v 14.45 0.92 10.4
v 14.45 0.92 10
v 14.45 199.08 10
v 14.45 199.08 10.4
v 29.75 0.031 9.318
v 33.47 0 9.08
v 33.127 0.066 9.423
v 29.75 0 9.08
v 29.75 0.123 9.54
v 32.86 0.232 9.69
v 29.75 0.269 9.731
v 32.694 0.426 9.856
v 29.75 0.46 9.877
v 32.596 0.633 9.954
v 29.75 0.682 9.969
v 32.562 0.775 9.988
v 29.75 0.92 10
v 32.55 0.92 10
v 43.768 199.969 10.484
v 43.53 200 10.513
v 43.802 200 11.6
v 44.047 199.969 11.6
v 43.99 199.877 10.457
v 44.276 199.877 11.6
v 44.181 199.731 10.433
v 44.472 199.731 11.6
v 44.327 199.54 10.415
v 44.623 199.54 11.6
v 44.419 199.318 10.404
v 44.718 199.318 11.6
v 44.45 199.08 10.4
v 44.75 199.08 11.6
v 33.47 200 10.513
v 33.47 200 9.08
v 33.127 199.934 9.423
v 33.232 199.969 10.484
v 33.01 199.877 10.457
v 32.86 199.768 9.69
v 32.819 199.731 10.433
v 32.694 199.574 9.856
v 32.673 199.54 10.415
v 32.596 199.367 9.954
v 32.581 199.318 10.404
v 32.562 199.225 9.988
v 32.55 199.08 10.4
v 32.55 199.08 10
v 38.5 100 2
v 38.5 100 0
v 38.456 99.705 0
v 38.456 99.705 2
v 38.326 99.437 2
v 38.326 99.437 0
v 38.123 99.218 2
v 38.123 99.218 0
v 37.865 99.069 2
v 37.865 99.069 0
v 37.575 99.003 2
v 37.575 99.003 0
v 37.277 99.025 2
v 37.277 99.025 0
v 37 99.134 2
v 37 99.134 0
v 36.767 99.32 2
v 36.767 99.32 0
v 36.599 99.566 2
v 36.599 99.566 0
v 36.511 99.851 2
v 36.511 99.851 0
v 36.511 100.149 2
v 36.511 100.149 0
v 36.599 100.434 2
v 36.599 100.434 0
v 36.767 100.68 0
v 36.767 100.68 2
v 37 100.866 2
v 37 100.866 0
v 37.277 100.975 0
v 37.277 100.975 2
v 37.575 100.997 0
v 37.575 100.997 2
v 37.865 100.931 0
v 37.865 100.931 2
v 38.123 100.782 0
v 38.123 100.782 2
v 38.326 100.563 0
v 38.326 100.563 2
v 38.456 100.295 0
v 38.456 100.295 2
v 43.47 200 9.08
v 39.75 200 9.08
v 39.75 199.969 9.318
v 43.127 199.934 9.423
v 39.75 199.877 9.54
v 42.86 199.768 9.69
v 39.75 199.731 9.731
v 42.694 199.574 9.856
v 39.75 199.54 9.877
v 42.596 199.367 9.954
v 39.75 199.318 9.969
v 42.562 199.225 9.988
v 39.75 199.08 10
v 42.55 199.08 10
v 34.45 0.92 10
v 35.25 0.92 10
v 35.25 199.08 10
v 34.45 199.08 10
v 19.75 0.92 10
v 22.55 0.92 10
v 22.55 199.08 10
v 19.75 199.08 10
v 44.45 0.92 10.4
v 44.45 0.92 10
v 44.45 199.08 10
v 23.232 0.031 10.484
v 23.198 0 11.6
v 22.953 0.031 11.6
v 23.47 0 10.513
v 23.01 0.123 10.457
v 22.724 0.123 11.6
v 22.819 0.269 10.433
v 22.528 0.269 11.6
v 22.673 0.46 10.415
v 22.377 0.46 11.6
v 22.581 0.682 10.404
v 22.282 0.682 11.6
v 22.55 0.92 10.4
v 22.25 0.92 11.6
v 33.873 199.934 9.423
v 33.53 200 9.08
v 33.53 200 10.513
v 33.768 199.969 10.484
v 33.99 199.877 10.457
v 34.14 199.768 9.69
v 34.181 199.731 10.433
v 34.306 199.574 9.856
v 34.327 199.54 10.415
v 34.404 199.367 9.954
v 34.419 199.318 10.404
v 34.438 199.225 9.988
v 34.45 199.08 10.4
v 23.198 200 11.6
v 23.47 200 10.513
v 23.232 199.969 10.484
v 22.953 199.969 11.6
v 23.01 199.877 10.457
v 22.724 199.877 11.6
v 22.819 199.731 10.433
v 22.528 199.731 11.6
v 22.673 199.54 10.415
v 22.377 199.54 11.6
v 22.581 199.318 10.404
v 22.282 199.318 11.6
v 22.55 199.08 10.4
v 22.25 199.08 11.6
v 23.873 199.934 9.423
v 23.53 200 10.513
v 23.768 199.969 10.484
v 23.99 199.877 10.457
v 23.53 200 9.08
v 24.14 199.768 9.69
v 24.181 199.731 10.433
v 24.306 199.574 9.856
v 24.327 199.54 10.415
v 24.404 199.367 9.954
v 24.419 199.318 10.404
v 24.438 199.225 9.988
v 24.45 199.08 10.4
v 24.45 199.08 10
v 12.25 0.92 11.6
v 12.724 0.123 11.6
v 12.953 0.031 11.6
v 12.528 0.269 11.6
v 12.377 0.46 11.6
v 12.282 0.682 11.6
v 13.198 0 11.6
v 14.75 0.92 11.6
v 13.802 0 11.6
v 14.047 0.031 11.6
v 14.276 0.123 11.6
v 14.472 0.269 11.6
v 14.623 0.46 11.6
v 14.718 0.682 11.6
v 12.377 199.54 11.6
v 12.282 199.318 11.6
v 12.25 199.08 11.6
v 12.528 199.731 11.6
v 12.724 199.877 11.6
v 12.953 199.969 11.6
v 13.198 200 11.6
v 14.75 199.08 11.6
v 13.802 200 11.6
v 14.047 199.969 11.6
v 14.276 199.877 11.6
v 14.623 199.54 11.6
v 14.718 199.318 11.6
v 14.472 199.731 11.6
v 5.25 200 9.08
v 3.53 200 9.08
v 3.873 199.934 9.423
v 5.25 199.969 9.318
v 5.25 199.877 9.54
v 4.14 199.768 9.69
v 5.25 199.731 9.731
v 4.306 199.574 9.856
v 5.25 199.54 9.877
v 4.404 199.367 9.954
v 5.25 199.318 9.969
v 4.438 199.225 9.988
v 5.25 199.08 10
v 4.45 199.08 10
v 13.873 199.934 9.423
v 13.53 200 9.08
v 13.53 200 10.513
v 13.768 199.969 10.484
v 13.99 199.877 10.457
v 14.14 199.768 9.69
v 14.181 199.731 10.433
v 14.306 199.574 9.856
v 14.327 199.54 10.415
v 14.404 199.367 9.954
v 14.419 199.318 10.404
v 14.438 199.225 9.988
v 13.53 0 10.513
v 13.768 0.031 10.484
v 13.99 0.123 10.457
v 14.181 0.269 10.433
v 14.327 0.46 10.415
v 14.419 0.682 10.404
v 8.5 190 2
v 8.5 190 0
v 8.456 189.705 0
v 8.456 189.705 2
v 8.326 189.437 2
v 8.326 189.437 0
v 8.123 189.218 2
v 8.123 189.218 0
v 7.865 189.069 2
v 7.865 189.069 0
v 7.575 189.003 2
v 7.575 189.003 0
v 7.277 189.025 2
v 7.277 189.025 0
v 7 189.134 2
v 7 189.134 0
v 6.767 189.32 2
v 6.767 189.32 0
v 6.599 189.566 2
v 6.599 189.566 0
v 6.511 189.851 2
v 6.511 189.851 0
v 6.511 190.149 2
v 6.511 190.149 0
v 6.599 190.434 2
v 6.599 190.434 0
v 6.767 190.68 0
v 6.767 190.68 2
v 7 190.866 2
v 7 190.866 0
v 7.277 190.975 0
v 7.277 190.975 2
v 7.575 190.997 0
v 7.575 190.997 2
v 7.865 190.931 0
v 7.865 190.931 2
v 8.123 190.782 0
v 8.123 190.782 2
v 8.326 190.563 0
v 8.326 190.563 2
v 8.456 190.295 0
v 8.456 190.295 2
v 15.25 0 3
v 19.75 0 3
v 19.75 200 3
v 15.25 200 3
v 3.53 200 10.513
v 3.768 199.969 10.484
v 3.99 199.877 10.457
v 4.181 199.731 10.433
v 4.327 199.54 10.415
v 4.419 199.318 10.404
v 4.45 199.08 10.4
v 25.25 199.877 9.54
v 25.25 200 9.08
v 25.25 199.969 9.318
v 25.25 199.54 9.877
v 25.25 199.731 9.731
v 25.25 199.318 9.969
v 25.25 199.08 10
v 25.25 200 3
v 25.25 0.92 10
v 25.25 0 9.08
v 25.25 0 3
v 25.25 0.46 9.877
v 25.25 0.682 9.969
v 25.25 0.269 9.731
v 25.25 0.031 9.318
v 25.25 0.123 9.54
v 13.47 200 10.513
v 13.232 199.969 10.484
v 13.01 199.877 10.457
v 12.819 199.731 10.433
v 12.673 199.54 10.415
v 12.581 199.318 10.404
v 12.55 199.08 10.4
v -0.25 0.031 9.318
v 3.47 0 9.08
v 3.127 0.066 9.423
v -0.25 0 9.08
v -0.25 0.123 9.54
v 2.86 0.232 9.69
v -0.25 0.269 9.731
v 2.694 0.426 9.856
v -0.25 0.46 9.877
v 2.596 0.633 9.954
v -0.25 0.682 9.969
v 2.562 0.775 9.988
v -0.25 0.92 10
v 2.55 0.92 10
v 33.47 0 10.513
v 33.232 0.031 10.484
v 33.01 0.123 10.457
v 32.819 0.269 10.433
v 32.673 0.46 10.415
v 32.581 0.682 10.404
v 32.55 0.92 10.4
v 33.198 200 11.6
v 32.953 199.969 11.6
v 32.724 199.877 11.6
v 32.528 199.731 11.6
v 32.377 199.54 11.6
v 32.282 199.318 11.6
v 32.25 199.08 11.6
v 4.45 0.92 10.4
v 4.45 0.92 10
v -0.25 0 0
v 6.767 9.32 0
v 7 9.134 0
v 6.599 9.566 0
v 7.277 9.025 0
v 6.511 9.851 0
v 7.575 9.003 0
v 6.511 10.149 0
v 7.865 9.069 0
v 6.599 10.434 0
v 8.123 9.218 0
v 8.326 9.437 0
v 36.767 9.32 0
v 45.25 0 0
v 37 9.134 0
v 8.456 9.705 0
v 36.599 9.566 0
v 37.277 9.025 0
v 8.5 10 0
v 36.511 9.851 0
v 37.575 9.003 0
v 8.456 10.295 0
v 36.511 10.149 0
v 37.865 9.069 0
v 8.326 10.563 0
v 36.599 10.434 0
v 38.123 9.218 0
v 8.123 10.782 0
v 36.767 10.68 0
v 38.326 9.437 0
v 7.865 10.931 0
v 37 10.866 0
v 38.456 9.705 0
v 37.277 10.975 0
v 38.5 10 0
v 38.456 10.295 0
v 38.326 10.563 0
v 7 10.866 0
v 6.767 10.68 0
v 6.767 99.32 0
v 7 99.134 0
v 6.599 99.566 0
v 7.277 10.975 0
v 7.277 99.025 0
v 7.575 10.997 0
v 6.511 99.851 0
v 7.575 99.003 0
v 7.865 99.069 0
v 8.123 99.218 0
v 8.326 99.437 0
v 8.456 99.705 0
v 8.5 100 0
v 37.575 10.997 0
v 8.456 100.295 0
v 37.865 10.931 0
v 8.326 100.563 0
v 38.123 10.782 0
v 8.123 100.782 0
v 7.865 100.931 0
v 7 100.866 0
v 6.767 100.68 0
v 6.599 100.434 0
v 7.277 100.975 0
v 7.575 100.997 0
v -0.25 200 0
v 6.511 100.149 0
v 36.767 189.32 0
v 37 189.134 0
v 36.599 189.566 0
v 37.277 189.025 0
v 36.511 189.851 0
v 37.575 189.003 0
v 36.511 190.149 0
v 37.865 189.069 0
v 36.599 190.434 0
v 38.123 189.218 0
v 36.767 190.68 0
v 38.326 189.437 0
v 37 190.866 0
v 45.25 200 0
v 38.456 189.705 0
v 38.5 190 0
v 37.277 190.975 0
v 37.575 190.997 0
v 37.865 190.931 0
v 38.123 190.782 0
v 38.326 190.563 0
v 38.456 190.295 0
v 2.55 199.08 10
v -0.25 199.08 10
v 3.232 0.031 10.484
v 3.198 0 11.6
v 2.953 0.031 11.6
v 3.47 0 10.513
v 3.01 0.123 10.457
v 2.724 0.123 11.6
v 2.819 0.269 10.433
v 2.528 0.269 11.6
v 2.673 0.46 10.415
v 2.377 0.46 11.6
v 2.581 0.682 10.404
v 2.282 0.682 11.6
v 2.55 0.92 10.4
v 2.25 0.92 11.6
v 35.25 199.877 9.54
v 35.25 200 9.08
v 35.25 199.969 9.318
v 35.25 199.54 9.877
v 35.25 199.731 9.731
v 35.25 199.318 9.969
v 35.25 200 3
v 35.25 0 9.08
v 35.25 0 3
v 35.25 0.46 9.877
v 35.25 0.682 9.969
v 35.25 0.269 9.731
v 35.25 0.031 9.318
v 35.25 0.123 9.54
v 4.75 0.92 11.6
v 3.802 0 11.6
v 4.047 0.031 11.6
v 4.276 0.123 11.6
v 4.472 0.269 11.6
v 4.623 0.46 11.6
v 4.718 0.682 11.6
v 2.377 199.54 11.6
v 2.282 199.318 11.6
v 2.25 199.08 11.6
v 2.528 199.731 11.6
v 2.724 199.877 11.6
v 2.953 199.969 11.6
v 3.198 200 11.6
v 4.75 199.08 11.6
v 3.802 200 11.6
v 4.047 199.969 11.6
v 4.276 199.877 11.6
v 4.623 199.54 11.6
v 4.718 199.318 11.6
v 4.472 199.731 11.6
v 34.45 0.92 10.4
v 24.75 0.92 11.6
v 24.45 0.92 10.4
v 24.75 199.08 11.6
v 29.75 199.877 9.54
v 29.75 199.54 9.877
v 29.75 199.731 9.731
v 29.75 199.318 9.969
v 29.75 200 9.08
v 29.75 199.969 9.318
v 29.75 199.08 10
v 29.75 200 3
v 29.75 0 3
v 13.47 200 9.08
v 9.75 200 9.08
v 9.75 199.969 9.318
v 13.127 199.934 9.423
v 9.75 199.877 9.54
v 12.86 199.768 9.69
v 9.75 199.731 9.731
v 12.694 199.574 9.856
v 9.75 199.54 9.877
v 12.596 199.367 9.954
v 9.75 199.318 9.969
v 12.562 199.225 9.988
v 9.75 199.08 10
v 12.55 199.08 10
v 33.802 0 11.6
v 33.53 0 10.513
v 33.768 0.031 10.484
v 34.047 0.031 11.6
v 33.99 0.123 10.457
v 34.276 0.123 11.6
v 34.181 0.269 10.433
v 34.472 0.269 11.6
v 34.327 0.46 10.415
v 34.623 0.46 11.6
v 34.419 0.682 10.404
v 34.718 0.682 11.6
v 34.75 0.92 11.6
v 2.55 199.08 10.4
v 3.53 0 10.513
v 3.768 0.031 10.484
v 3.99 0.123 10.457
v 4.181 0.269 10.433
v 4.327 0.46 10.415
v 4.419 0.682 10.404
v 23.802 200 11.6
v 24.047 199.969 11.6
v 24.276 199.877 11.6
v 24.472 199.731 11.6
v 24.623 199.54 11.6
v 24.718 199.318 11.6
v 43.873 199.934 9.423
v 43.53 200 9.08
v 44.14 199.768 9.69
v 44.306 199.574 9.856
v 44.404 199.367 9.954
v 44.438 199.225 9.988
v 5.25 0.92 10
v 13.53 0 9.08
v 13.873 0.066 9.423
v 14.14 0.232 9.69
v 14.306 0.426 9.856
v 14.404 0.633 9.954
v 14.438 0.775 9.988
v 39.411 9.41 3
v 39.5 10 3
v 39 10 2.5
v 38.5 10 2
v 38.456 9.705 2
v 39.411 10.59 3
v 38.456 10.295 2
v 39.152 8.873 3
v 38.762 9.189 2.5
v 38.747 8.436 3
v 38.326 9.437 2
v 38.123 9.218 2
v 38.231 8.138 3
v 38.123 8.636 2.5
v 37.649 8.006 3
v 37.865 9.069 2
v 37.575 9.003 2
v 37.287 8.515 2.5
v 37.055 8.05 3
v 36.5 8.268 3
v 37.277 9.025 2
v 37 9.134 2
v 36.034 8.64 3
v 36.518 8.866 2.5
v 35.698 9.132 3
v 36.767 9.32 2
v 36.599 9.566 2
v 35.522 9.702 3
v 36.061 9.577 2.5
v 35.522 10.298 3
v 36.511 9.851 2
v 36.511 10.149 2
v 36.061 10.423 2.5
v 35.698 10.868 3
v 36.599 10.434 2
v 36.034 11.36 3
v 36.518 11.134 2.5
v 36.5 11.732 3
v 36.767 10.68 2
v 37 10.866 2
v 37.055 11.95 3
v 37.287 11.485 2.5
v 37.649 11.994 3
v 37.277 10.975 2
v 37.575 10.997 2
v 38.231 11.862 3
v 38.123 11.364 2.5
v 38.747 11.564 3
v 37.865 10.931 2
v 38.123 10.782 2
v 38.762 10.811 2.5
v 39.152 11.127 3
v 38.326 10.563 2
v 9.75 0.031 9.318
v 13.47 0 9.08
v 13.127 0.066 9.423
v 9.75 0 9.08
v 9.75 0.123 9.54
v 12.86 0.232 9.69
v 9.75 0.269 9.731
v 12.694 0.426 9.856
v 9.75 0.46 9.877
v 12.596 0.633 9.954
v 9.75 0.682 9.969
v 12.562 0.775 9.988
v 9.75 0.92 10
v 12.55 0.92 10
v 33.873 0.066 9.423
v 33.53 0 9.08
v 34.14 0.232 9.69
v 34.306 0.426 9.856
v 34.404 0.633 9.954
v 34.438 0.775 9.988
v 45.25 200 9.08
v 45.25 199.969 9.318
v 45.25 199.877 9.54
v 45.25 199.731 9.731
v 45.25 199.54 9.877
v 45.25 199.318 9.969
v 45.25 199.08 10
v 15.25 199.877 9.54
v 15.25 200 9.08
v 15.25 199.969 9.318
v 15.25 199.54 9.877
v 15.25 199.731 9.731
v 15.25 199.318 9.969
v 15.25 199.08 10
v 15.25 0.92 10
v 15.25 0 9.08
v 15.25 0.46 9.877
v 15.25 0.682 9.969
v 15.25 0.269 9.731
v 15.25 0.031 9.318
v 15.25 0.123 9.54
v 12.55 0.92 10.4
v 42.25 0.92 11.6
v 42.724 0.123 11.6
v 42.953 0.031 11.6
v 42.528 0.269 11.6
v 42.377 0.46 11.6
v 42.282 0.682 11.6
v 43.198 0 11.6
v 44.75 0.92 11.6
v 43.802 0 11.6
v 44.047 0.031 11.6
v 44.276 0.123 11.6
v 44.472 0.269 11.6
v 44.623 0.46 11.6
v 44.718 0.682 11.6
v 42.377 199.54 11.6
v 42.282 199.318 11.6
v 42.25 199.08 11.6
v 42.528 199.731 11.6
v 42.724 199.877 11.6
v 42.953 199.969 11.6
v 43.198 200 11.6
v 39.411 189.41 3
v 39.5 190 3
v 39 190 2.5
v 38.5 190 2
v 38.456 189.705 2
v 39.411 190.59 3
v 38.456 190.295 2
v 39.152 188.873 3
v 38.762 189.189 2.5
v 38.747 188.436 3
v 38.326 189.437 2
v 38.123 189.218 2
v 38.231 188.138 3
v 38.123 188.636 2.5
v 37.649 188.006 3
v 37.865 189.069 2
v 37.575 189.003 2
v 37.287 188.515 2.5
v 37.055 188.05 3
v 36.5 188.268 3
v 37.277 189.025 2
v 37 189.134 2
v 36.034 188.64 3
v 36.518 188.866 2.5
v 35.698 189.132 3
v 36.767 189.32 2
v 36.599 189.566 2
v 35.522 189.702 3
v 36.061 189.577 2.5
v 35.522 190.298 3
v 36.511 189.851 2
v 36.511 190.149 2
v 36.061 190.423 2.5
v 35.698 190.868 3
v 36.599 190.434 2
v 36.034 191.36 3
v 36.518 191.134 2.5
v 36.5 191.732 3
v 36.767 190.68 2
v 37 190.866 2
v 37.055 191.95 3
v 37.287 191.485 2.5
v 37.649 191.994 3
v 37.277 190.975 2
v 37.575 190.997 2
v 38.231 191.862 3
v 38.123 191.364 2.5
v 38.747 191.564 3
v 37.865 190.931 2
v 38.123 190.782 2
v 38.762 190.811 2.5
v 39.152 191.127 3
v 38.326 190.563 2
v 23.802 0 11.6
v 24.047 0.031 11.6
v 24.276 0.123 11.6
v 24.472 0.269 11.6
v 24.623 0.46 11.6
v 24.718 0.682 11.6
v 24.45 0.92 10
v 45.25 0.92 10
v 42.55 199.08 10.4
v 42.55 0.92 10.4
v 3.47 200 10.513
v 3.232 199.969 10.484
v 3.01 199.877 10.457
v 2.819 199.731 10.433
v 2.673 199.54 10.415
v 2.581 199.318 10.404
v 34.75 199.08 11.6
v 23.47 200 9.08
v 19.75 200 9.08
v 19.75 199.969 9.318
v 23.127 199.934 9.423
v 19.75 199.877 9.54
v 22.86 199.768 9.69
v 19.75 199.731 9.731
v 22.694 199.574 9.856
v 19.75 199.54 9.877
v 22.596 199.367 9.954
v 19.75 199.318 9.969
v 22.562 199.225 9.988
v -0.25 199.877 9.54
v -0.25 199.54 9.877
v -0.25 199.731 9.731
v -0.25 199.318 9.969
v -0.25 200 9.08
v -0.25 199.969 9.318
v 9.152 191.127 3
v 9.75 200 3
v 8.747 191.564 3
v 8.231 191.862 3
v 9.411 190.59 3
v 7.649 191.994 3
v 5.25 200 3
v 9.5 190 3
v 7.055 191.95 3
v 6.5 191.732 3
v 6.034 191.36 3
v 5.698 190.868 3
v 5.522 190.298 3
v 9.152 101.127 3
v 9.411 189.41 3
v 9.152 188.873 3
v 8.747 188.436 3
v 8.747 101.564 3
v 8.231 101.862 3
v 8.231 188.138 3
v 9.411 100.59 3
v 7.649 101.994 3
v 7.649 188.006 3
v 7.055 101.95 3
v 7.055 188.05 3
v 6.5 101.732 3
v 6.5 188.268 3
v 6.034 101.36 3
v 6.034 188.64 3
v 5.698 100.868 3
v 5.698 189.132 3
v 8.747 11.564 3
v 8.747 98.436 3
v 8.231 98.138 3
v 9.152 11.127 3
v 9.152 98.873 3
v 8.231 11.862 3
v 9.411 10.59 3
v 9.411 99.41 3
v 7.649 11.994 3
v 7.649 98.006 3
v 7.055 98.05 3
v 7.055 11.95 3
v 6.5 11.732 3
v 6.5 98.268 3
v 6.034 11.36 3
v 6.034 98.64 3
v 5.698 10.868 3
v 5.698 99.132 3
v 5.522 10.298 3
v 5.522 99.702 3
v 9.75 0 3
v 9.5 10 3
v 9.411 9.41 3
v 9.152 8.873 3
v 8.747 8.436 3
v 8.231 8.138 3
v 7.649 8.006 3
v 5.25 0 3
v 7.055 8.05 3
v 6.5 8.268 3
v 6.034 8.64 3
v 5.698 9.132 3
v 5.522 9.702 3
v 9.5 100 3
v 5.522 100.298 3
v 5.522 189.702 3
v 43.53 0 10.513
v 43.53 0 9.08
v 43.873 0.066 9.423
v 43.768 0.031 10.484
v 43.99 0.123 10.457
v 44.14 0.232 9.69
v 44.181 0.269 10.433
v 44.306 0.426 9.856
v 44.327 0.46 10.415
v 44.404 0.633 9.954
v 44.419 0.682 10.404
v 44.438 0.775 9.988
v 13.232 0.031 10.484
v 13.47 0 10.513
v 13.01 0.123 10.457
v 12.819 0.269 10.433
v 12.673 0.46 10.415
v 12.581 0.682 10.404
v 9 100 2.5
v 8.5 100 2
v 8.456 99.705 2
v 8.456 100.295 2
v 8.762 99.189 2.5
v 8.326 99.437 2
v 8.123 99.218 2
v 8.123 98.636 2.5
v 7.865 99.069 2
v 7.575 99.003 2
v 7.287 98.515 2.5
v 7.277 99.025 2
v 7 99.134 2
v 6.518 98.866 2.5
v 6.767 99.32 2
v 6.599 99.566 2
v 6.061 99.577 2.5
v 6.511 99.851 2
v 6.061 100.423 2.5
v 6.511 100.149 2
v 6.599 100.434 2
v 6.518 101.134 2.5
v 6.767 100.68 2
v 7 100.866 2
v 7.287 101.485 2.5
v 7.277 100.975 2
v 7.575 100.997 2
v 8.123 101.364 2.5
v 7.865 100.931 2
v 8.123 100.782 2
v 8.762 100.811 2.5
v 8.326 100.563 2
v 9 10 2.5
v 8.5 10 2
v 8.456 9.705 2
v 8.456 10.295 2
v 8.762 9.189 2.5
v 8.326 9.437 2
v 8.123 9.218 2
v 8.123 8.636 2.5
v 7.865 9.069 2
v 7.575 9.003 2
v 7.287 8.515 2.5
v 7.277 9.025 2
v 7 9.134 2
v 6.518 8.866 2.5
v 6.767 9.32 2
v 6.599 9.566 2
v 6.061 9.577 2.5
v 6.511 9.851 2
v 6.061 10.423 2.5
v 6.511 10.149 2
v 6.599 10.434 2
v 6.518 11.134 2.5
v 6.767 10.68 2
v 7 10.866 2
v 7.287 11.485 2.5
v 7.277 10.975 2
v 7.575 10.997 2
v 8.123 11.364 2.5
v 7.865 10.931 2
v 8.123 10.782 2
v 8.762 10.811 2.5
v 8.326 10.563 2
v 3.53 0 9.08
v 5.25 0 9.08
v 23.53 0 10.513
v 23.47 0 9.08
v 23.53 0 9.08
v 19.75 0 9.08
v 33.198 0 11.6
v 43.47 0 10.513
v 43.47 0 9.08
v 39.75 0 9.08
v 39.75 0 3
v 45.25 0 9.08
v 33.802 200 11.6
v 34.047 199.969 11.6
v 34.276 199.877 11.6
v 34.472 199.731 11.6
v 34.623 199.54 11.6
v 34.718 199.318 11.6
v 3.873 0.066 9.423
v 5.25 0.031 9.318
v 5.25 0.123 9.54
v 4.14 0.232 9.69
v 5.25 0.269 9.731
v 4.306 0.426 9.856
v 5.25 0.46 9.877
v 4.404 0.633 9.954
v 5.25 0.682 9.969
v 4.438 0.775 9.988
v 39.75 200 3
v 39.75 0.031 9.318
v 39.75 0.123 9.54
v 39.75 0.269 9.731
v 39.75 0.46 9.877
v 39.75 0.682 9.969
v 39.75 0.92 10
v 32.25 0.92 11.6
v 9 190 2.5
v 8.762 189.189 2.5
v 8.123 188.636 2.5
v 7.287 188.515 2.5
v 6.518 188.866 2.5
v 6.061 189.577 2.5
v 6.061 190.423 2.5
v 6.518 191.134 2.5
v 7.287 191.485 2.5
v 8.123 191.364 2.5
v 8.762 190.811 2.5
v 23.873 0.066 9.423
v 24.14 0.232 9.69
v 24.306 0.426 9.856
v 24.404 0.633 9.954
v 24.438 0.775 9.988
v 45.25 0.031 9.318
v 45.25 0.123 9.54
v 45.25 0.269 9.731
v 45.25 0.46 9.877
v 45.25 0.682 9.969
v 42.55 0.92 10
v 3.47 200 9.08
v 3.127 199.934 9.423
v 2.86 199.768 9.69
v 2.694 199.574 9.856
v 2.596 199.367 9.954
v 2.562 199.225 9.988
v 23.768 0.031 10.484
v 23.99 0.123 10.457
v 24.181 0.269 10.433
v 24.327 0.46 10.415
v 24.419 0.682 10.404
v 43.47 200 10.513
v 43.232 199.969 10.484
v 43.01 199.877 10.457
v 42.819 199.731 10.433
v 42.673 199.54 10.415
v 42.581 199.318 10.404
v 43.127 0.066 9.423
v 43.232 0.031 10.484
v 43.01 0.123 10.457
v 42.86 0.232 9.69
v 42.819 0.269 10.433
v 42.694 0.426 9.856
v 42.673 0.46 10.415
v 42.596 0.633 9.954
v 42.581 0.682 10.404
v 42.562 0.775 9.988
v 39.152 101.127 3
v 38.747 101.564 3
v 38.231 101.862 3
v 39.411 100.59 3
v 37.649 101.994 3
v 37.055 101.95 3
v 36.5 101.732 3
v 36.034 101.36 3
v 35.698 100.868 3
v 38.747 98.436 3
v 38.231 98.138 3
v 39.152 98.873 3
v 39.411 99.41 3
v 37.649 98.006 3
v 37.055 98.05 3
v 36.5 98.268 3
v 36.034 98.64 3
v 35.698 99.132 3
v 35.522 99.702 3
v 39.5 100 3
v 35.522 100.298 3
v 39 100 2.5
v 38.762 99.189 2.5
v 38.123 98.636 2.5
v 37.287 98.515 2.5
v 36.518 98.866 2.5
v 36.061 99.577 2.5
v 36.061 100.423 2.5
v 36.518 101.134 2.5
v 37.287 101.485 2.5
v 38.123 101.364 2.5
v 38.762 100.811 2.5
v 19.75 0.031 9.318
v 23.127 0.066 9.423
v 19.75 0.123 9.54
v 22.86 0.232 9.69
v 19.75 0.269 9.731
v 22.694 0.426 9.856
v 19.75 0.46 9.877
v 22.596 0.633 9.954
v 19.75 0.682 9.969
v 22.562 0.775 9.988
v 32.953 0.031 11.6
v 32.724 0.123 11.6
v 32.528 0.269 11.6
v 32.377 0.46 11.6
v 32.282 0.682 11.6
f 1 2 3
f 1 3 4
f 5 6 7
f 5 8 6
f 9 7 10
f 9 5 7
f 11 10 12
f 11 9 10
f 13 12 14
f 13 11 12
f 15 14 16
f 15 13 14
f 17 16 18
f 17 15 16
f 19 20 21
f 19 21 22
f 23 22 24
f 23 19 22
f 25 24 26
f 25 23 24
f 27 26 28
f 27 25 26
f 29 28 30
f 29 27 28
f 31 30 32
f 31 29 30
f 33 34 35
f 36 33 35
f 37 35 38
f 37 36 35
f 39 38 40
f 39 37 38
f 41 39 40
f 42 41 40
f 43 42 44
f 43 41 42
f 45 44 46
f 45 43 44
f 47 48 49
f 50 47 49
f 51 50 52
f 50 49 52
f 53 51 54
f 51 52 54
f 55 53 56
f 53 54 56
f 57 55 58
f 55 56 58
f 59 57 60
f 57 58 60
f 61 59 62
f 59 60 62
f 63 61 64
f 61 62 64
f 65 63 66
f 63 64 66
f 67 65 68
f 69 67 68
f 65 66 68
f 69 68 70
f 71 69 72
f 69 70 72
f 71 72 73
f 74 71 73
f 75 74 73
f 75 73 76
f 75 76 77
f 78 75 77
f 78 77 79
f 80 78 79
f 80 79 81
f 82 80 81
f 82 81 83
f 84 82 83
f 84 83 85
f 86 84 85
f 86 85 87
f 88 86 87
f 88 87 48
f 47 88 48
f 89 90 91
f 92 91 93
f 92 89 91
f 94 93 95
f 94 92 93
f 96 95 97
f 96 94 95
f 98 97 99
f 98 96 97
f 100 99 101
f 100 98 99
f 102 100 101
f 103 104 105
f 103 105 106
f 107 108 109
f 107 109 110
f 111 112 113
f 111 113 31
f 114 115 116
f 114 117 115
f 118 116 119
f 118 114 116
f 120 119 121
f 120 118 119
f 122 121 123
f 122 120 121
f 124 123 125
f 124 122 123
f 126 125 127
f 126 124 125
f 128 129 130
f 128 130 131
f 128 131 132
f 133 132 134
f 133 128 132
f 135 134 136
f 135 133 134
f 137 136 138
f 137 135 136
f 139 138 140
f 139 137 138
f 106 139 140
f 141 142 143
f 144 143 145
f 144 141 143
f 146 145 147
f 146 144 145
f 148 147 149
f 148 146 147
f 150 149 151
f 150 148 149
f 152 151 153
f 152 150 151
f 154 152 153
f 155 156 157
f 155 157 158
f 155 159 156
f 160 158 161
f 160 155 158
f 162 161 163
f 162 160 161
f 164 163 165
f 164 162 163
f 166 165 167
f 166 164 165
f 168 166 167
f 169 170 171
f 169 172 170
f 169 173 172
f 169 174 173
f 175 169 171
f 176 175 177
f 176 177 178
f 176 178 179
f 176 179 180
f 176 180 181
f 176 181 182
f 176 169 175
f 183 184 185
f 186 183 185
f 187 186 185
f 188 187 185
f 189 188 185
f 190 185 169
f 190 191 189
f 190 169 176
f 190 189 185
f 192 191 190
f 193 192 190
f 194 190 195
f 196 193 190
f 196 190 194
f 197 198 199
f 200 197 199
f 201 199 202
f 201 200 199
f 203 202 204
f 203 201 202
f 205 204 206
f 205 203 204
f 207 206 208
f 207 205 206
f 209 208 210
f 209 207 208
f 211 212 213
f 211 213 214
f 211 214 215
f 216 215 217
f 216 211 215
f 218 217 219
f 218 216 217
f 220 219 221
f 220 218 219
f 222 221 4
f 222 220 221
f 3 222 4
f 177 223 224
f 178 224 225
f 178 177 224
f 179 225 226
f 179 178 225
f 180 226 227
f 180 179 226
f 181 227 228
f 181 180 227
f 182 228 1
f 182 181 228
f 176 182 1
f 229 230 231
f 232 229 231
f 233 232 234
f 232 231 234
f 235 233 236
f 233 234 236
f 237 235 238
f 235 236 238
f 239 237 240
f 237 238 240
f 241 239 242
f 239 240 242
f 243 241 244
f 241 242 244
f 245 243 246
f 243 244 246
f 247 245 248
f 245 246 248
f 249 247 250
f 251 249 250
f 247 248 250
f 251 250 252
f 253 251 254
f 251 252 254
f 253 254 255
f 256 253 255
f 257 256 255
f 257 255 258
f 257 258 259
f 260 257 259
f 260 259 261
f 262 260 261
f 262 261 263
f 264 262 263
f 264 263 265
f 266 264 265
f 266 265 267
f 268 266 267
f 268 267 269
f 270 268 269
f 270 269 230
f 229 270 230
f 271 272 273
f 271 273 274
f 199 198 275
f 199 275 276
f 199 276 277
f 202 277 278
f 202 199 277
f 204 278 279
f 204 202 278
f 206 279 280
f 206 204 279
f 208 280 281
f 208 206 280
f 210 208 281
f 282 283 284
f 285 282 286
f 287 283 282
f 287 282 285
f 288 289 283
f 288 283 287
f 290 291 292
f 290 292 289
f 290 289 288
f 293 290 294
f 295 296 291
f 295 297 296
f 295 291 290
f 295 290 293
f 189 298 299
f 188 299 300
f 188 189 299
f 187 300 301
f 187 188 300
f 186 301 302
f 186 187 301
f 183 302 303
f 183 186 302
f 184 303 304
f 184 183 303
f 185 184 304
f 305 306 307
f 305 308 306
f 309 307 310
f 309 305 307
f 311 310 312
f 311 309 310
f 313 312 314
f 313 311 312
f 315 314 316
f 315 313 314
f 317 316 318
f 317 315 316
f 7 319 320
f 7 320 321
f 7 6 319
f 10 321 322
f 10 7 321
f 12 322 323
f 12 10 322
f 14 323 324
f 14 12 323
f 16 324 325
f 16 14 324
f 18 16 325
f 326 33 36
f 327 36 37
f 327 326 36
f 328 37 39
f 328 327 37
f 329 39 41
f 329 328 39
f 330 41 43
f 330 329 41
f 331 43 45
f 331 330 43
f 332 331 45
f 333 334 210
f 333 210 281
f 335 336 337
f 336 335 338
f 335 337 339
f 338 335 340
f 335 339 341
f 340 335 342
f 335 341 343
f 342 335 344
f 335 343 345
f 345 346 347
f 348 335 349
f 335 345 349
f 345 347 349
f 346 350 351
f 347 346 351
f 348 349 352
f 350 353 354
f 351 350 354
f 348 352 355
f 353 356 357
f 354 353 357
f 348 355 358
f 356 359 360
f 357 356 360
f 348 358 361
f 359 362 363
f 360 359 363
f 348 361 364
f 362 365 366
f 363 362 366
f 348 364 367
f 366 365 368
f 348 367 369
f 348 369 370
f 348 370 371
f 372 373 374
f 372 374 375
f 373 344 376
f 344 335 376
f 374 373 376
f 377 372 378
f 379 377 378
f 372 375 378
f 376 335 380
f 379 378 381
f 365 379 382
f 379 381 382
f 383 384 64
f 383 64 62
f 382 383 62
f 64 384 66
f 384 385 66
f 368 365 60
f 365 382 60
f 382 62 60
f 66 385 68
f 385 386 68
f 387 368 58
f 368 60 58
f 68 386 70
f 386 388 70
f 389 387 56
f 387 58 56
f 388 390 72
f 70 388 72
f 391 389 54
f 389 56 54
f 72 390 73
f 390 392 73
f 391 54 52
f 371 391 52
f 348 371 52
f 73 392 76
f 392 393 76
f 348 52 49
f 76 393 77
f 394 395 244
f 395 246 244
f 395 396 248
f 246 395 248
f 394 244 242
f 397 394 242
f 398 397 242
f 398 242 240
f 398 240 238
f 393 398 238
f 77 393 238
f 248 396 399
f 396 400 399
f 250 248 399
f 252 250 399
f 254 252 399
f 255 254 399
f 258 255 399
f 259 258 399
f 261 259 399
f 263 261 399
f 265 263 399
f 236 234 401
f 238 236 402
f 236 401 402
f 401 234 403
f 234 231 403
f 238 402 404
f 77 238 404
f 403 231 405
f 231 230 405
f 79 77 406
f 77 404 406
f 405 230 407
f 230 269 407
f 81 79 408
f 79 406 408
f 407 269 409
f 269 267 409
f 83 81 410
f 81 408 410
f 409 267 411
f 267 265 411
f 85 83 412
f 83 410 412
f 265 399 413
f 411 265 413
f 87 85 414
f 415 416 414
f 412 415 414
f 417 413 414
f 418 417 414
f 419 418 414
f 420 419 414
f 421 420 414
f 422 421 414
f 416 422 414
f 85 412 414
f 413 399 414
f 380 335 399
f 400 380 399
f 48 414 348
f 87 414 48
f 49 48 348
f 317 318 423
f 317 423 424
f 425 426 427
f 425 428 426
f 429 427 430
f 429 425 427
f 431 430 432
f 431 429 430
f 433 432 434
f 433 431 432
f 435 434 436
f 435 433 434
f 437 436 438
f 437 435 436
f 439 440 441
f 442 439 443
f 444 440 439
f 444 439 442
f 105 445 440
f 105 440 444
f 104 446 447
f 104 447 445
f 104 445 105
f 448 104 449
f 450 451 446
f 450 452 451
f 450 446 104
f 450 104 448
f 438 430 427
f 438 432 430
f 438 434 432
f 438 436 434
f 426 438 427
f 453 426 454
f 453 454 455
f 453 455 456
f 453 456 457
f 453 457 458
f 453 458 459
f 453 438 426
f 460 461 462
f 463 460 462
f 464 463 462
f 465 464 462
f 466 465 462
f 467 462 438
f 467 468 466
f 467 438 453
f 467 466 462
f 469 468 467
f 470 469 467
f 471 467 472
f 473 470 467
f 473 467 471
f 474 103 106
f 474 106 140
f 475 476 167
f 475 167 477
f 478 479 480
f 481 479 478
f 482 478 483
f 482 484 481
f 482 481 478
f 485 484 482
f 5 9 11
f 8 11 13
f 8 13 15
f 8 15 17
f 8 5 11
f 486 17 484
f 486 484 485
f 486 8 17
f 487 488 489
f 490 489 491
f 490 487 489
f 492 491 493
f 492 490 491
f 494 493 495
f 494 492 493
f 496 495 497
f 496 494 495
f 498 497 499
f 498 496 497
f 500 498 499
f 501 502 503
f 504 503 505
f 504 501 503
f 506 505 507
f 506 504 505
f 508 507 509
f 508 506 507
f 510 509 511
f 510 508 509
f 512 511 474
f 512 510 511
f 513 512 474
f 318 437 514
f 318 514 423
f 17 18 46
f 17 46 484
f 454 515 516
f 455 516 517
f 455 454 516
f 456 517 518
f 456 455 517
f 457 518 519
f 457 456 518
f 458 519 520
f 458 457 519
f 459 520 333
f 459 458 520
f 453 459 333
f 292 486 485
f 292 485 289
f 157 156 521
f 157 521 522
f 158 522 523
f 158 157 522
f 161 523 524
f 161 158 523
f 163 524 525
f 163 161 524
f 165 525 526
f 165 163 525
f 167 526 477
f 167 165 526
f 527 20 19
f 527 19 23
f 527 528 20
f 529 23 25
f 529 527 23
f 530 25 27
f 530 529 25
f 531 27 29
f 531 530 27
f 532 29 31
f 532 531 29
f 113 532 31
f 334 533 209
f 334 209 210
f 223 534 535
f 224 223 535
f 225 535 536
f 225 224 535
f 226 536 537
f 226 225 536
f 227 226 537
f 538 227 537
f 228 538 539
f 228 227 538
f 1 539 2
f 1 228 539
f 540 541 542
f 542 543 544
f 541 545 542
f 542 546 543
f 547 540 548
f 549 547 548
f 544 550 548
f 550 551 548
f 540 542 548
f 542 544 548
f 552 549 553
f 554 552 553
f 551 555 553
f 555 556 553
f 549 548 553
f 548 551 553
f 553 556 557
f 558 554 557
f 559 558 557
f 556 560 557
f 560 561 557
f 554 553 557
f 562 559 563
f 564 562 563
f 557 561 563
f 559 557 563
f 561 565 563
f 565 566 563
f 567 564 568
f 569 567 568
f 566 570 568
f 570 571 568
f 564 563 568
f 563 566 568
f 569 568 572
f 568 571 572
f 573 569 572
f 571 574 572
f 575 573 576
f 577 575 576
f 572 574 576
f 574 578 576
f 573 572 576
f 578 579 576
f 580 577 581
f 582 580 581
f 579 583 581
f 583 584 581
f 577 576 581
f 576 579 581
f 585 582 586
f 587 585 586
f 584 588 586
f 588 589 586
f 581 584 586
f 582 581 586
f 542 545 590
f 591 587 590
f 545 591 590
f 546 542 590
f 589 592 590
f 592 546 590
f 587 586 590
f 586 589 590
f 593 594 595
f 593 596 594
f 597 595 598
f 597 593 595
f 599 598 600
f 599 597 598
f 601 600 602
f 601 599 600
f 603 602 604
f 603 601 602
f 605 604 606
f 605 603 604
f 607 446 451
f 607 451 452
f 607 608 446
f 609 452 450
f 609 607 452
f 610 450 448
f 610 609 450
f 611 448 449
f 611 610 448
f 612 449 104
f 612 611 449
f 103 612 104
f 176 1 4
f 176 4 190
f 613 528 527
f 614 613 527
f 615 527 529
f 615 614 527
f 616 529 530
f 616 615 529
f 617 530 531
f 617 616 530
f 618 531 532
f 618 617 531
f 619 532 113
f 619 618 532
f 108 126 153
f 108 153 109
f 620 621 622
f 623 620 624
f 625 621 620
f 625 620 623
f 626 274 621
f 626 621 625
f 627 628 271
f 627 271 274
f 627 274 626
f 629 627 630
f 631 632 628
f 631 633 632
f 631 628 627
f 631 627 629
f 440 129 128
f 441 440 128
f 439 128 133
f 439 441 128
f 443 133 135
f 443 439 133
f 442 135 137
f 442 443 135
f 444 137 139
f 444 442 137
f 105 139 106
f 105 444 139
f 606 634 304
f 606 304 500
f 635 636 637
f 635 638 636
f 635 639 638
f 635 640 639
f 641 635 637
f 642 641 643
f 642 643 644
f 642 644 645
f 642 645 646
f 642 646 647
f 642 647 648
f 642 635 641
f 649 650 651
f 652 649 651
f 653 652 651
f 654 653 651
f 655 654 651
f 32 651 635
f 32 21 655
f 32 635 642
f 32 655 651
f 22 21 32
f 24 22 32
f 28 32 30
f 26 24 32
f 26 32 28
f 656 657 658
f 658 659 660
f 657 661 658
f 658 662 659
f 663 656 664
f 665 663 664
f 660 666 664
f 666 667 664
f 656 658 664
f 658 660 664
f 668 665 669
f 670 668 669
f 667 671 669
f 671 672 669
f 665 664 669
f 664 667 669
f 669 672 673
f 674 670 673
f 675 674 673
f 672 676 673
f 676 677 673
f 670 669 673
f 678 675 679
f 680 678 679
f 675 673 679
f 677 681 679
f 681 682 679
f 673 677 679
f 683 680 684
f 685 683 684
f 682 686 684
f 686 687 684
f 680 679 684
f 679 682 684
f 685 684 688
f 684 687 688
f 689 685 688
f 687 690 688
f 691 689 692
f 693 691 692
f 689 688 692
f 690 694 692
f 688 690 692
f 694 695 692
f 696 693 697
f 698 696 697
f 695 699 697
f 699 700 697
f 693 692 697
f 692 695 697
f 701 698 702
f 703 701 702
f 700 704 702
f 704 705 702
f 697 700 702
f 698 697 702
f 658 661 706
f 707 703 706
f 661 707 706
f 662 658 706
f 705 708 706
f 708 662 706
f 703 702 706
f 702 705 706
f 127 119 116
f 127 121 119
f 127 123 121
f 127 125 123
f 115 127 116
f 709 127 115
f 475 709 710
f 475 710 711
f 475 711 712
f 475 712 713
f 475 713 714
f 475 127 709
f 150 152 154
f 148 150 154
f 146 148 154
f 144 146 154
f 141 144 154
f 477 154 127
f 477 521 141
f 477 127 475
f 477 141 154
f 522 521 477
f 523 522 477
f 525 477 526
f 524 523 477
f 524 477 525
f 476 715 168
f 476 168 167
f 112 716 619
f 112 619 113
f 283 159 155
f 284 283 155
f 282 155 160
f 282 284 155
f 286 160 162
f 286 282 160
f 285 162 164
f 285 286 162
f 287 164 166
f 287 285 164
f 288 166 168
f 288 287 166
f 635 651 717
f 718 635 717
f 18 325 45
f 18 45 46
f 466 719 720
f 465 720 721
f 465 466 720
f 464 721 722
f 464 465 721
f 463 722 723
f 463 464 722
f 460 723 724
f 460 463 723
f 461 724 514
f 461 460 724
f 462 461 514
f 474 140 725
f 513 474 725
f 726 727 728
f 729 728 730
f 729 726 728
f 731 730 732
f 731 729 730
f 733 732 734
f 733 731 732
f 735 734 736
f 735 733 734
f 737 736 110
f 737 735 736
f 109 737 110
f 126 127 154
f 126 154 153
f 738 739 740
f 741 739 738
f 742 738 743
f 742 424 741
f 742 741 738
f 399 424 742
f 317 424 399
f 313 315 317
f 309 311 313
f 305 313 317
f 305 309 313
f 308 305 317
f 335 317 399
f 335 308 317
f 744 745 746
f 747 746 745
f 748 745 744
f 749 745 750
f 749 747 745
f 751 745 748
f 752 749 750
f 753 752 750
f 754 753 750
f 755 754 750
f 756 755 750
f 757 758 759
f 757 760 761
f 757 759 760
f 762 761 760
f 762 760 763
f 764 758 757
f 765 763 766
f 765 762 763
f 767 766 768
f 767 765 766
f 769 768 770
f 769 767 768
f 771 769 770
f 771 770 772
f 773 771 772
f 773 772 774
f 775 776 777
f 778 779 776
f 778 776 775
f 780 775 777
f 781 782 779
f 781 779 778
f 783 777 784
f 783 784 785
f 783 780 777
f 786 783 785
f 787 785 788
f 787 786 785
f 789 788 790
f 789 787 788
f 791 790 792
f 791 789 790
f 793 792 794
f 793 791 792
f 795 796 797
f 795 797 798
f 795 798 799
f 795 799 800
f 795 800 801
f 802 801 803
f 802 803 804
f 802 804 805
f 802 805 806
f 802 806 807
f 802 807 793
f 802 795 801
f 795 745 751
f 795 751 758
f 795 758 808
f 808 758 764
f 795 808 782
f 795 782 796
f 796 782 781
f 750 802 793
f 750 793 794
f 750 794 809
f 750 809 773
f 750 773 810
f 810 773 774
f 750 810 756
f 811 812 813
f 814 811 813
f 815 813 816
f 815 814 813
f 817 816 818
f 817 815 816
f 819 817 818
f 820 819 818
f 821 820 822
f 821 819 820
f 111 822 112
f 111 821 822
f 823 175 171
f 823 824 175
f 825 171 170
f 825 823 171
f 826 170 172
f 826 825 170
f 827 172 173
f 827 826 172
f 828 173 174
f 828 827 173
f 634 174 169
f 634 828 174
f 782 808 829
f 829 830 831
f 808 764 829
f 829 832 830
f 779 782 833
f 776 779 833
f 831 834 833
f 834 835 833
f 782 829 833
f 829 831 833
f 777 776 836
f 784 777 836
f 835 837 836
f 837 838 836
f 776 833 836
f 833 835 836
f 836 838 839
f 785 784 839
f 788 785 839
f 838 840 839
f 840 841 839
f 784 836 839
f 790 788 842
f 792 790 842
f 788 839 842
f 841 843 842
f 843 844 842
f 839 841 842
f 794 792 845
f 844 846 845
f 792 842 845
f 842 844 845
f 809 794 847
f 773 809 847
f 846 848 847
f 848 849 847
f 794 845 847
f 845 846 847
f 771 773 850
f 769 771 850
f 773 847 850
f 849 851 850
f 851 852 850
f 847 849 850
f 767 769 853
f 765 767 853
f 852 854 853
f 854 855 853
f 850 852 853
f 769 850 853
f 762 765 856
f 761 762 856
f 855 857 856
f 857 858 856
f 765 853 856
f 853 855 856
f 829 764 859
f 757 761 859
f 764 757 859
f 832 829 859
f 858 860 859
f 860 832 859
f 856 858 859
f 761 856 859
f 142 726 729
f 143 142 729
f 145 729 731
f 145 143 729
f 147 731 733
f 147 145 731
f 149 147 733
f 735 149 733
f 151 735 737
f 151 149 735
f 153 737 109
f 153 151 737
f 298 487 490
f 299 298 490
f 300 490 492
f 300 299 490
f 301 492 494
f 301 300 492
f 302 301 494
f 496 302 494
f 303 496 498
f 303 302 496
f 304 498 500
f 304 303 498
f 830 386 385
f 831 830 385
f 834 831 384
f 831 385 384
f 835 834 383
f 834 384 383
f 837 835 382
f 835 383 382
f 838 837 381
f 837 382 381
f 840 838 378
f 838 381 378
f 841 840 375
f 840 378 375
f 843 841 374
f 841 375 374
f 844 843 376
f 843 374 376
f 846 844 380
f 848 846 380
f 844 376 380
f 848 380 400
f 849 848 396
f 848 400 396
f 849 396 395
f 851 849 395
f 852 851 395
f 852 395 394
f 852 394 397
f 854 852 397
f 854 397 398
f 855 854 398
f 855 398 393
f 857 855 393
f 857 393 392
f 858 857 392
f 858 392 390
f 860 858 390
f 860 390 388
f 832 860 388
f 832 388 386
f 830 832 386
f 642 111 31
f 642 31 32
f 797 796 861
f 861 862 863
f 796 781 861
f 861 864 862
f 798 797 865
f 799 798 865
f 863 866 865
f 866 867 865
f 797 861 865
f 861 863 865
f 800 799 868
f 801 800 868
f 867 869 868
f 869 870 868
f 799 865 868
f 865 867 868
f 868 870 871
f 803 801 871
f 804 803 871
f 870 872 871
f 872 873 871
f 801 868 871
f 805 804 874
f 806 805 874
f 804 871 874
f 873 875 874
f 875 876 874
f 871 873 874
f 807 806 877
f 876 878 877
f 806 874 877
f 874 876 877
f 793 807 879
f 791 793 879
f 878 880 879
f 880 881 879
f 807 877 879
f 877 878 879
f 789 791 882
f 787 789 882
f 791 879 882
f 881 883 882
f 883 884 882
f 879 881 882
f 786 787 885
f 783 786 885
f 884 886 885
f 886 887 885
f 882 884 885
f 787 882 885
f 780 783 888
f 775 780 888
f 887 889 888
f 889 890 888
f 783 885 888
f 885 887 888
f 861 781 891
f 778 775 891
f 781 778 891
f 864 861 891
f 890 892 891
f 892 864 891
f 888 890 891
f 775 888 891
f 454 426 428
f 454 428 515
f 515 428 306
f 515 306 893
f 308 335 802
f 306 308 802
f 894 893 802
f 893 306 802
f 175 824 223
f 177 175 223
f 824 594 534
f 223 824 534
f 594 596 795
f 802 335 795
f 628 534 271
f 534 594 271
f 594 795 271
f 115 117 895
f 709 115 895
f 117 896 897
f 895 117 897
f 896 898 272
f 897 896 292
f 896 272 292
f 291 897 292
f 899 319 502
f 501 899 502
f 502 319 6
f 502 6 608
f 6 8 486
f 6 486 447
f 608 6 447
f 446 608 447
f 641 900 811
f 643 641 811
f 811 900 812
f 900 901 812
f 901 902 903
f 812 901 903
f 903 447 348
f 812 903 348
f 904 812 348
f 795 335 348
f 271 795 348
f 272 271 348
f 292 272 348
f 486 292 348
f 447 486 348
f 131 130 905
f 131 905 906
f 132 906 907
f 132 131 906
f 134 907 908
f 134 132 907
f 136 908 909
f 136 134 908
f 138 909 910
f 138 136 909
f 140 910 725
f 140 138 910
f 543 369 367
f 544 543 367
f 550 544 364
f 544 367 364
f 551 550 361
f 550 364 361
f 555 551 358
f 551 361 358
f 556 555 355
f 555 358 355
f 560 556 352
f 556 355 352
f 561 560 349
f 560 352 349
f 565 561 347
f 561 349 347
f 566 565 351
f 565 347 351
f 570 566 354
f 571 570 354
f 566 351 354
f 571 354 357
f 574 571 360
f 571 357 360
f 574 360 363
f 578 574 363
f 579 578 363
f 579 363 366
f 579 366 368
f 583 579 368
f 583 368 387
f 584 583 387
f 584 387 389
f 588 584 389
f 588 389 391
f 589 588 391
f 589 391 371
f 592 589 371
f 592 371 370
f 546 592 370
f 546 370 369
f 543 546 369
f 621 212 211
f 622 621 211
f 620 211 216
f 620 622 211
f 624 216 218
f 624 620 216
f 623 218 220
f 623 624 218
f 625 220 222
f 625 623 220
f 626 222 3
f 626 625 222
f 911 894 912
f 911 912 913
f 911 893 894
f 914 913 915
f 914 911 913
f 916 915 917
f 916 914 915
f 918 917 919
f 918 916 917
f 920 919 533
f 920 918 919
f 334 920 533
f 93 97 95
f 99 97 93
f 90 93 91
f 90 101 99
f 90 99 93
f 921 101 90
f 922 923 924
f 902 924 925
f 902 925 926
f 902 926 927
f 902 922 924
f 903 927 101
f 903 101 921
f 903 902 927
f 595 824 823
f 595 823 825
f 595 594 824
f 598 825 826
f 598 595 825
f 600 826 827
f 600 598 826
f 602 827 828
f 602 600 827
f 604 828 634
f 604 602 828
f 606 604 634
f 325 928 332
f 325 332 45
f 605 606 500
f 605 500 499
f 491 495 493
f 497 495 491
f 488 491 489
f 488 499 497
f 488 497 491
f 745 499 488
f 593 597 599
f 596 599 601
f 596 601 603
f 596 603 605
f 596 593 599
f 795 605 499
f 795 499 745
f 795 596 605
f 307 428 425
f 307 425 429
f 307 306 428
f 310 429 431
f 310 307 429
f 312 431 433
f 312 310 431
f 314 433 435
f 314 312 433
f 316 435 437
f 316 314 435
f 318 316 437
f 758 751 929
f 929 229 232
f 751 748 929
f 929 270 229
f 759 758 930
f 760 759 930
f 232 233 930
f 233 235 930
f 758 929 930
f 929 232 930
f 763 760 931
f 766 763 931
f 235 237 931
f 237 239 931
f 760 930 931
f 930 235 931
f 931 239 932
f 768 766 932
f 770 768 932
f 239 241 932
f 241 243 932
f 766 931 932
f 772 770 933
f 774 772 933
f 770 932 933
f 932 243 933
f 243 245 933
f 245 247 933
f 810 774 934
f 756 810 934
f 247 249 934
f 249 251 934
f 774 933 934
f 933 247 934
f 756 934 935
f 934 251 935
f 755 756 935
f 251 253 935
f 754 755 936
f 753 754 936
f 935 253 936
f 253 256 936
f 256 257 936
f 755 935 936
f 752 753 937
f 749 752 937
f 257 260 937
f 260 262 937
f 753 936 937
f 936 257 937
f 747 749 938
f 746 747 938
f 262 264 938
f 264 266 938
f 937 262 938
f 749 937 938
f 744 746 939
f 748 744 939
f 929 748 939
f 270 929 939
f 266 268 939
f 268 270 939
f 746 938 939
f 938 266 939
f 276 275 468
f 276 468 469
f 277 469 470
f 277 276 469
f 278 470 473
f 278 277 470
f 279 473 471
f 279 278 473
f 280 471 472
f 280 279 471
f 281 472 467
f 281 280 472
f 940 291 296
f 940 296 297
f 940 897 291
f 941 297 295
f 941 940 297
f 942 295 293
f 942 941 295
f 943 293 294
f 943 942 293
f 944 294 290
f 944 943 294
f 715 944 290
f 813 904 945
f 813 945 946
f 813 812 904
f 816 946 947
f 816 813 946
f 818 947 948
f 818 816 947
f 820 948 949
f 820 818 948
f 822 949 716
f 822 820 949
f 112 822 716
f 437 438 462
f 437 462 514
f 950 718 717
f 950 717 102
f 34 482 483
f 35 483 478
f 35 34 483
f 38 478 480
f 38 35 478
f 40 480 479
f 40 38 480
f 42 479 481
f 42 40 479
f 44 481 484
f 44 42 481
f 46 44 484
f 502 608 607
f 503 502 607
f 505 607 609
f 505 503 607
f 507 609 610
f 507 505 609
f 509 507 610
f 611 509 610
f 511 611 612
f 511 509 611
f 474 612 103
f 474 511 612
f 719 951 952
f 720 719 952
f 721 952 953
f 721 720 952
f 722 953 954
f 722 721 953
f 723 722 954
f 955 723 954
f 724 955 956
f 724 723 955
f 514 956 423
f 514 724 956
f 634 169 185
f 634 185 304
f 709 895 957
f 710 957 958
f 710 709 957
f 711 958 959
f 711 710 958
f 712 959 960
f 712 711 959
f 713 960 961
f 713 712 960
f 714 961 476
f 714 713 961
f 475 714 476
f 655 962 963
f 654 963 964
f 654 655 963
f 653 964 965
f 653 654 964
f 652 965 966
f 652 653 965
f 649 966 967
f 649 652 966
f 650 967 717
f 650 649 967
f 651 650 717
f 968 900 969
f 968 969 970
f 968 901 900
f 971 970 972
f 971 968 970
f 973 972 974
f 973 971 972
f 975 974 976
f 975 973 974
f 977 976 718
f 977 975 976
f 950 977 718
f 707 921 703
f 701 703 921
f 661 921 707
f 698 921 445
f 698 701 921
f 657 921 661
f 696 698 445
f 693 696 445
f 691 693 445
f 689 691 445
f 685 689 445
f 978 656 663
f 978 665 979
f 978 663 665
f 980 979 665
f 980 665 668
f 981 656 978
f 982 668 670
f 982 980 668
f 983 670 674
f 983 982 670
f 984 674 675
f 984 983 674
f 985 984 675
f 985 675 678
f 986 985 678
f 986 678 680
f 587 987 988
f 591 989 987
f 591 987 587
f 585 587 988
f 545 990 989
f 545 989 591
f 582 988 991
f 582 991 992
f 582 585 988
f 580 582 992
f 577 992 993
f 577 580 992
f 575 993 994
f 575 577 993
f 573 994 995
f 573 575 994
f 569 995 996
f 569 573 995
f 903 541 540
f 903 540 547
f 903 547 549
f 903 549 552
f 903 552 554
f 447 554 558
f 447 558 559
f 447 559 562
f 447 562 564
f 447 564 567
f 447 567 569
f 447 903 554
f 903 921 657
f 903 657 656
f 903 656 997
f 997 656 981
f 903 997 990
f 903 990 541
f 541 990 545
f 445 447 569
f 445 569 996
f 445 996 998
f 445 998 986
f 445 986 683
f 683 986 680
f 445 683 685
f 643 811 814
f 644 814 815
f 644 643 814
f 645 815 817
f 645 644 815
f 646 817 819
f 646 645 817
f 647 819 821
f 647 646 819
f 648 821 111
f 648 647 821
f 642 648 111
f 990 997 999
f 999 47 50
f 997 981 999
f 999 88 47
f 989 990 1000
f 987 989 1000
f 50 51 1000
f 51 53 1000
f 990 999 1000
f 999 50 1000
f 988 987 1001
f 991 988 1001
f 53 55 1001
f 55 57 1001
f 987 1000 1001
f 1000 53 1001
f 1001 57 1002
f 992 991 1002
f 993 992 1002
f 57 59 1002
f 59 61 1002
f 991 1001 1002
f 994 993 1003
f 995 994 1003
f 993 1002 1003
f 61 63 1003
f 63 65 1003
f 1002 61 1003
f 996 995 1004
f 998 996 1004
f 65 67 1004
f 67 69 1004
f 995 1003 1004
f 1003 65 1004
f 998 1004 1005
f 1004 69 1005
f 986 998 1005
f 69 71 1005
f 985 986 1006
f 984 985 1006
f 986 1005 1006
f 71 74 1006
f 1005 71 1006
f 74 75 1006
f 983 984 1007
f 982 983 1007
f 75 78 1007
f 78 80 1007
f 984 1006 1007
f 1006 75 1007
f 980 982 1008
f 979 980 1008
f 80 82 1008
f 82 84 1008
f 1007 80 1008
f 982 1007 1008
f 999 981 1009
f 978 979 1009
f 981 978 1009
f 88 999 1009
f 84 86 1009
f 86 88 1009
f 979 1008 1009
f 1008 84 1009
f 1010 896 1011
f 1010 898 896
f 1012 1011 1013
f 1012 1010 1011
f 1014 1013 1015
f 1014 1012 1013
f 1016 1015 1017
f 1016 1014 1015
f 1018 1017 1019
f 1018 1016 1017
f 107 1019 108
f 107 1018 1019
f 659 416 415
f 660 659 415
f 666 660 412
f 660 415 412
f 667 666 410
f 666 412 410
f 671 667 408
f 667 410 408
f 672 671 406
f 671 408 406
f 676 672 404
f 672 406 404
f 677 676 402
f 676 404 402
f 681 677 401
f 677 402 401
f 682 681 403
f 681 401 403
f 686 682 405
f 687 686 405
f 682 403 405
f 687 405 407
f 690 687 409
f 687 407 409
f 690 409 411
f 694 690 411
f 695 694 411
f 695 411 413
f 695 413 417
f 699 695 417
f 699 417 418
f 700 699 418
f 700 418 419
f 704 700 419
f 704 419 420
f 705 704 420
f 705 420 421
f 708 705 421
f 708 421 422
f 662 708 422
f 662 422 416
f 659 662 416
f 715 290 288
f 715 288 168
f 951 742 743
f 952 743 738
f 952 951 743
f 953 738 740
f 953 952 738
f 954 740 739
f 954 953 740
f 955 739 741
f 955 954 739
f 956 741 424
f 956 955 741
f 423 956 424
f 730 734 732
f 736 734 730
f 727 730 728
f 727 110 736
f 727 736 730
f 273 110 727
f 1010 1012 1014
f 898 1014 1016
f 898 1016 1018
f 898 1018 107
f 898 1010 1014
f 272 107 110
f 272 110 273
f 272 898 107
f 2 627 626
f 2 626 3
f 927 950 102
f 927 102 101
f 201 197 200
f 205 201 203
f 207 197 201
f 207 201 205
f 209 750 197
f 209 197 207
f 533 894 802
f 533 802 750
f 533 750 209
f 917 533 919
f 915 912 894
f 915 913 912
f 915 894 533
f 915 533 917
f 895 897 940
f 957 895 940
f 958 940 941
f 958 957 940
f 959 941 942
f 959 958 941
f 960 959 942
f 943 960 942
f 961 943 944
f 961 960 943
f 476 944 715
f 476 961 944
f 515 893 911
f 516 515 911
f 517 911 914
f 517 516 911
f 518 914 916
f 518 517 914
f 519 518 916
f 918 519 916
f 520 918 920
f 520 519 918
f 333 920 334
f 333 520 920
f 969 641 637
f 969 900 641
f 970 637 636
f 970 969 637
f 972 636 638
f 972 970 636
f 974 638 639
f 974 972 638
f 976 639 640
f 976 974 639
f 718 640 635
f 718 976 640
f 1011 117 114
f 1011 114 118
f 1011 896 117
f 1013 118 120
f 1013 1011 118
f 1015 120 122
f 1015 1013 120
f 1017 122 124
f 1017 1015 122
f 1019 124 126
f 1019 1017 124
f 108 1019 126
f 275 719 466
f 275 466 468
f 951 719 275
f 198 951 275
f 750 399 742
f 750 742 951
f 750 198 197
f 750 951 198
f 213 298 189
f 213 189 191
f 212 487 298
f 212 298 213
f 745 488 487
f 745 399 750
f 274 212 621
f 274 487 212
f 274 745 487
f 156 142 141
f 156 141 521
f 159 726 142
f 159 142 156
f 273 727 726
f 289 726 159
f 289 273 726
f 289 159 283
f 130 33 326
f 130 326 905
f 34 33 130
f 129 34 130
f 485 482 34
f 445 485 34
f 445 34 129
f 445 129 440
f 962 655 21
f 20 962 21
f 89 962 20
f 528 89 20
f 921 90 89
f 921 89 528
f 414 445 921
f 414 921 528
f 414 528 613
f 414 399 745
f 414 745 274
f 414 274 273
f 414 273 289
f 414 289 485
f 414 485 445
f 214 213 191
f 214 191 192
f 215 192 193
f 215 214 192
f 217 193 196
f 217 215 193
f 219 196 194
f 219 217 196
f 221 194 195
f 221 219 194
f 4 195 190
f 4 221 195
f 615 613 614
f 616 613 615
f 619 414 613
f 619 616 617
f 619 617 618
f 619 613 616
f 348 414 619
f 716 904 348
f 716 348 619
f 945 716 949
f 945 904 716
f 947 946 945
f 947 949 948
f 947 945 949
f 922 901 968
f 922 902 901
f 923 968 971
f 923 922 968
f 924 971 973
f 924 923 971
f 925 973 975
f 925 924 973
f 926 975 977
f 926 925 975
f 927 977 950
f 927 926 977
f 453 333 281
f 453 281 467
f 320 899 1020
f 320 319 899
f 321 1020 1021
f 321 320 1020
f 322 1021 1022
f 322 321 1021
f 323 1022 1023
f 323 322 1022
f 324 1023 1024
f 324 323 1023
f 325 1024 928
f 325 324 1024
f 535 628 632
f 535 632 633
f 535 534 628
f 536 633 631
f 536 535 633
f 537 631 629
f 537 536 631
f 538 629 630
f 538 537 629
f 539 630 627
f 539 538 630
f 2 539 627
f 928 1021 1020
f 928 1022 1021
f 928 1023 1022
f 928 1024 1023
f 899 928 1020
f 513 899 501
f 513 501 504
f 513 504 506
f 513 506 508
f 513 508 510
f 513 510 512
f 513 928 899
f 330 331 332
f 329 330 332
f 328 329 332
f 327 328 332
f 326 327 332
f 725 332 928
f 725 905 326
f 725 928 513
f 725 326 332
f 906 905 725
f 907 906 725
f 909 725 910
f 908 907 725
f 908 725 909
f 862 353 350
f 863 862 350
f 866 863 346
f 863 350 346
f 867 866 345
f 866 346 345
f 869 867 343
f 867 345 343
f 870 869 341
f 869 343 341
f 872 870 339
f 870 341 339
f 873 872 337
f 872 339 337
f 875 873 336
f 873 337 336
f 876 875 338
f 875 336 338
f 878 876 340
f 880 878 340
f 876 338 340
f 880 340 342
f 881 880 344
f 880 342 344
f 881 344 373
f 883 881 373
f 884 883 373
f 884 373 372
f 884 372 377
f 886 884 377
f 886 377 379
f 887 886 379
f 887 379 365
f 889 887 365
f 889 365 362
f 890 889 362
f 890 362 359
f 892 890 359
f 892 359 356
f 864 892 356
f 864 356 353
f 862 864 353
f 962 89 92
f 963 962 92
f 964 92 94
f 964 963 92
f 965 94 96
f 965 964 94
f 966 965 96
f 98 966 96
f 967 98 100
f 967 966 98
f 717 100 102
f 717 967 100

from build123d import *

# Parameters (mm, degrees)
BOX_W               = 70
BOX_H               = 200
BOX_DEPTH           = 11.6
POCKET_DEPTH        = 200.001
LINEARPATTERN_COUNT = 6
LINEARPATTERN_PITCH = 10
SKETCH_W            = 82.408782
SKETCH_H            = 38.885188
SKETCH_W_2          = 45.5
SKETCH_H_2          = 14.501198
POCKET001_DEPTH     = 200.001
SKETCH003_R         = 1
POCKET002_DEPTH     = 11.601
CHAMFER_SIZE        = 1
FILLET_R            = 0.92


with BuildPart() as part:
    # Box → Box (new body)
    with BuildSketch(Plane(origin=(-7.5, 0, 0), x_dir=(1, 0, 0), z_dir=(0, 0, 1))):
        with Locations((35, 100)):
            Rectangle(BOX_W, BOX_H)
    extrude(amount=BOX_DEPTH)

    # Sketch002 → Pocket (cut, through all)
    with BuildSketch(Plane(origin=(-7.5, 0, 0), x_dir=(1, 0, 0), z_dir=(0, -1, 0))):
        Polygon((10.05, 10), (7.25, 10), (7.25, 3), (2.75, 3), (2.75, 10), (1.95, 10), (1.95, 10.4), (2.25, 11.6), (9.75, 11.6), (10.05, 10.4), align=None)
    pocket = extrude(amount=-POCKET_DEPTH, mode=Mode.SUBTRACT)

    # LinearPattern: Pocket ×6
    with Locations(*[(i * LINEARPATTERN_PITCH, 0, 0) for i in range(1, LINEARPATTERN_COUNT)]):
        add(pocket, mode=Mode.SUBTRACT)

    # Sketch → Pocket001 (cut, through all)
    with BuildSketch(Plane(origin=(-7.5, 0, 0), x_dir=(1, 0, 0), z_dir=(0, -1, 0))):
        with Locations((35.413628, 6.289411)):
            Rectangle(SKETCH_W, SKETCH_H)
        with Locations((30, 5.862397)):
            Rectangle(SKETCH_W_2, SKETCH_H_2, mode=Mode.SUBTRACT)
    extrude(amount=-POCKET001_DEPTH, mode=Mode.SUBTRACT)

    # Sketch003 → Pocket002 (cut, through all)
    with BuildSketch(Plane(origin=(-7.5, 0, 0), x_dir=(1, 0, 0), z_dir=(0, 0, -1))):
        with Locations((15, -10)):
            Circle(SKETCH003_R)
        with Locations((45, -10)):
            Circle(SKETCH003_R)
        with Locations((15, -190)):
            Circle(SKETCH003_R)
        with Locations((45, -190)):
            Circle(SKETCH003_R)
        with Locations((15, -100)):
            Circle(SKETCH003_R)
        with Locations((45, -100)):
            Circle(SKETCH003_R)
    extrude(amount=-POCKET002_DEPTH, mode=Mode.SUBTRACT)

    # Chamfer
    chamfer_edges = [part.edges().sort_by_distance(p)[0] for p in [
        (36.5, 190, 3),
        (6.5, 190, 3),
        (36.5, 100, 3),
        (6.5, 100, 3),
        (36.5, 10, 3),
        (6.5, 10, 3),
    ]]
    chamfer(chamfer_edges, length=CHAMFER_SIZE)

    # Fillet
    fillet_edges = [part.edges().sort_by_distance(p)[0] for p in [
        (1.15, 0, 10),
        (2.55, 0, 10.2),
        (2.4, 0, 11),
        (4.6, 0, 11),
        (4.45, 0, 10.2),
        (4.85, 0, 10),
        (11.15, 0, 10),
        (12.55, 0, 10.2),
        (12.4, 0, 11),
        (14.6, 0, 11),
        (14.45, 0, 10.2),
        (14.85, 0, 10),
        (21.15, 0, 10),
        (22.55, 0, 10.2),
        (22.4, 0, 11),
        (24.6, 0, 11),
        (24.45, 0, 10.2),
        (24.85, 0, 10),
        (31.15, 0, 10),
        (32.55, 0, 10.2),
        (32.4, 0, 11),
        (34.6, 0, 11),
        (34.45, 0, 10.2),
        (34.85, 0, 10),
        (41.15, 0, 10),
        (42.55, 0, 10.2),
        (42.4, 0, 11),
        (44.6, 0, 11),
        (44.45, 0, 10.2),
        (44.85, 0, 10),
        (1.15, 200, 10),
        (2.55, 200, 10.2),
        (2.4, 200, 11),
        (4.85, 200, 10),
        (4.45, 200, 10.2),
        (4.6, 200, 11),
        (11.15, 200, 10),
        (12.55, 200, 10.2),
        (12.4, 200, 11),
        (14.6, 200, 11),
        (14.45, 200, 10.2),
        (14.85, 200, 10),
        (21.15, 200, 10),
        (22.55, 200, 10.2),
        (22.4, 200, 11),
        (24.6, 200, 11),
        (24.45, 200, 10.2),
        (24.85, 200, 10),
        (31.15, 200, 10),
        (32.55, 200, 10.2),
        (32.4, 200, 11),
        (34.6, 200, 11),
        (34.45, 200, 10.2),
        (34.85, 200, 10),
        (41.15, 200, 10),
        (42.55, 200, 10.2),
        (42.4, 200, 11),
        (44.6, 200, 11),
        (44.45, 200, 10.2),
        (44.85, 200, 10),
    ]]
    fillet(fillet_edges, radius=FILLET_R)


solid = part.part
